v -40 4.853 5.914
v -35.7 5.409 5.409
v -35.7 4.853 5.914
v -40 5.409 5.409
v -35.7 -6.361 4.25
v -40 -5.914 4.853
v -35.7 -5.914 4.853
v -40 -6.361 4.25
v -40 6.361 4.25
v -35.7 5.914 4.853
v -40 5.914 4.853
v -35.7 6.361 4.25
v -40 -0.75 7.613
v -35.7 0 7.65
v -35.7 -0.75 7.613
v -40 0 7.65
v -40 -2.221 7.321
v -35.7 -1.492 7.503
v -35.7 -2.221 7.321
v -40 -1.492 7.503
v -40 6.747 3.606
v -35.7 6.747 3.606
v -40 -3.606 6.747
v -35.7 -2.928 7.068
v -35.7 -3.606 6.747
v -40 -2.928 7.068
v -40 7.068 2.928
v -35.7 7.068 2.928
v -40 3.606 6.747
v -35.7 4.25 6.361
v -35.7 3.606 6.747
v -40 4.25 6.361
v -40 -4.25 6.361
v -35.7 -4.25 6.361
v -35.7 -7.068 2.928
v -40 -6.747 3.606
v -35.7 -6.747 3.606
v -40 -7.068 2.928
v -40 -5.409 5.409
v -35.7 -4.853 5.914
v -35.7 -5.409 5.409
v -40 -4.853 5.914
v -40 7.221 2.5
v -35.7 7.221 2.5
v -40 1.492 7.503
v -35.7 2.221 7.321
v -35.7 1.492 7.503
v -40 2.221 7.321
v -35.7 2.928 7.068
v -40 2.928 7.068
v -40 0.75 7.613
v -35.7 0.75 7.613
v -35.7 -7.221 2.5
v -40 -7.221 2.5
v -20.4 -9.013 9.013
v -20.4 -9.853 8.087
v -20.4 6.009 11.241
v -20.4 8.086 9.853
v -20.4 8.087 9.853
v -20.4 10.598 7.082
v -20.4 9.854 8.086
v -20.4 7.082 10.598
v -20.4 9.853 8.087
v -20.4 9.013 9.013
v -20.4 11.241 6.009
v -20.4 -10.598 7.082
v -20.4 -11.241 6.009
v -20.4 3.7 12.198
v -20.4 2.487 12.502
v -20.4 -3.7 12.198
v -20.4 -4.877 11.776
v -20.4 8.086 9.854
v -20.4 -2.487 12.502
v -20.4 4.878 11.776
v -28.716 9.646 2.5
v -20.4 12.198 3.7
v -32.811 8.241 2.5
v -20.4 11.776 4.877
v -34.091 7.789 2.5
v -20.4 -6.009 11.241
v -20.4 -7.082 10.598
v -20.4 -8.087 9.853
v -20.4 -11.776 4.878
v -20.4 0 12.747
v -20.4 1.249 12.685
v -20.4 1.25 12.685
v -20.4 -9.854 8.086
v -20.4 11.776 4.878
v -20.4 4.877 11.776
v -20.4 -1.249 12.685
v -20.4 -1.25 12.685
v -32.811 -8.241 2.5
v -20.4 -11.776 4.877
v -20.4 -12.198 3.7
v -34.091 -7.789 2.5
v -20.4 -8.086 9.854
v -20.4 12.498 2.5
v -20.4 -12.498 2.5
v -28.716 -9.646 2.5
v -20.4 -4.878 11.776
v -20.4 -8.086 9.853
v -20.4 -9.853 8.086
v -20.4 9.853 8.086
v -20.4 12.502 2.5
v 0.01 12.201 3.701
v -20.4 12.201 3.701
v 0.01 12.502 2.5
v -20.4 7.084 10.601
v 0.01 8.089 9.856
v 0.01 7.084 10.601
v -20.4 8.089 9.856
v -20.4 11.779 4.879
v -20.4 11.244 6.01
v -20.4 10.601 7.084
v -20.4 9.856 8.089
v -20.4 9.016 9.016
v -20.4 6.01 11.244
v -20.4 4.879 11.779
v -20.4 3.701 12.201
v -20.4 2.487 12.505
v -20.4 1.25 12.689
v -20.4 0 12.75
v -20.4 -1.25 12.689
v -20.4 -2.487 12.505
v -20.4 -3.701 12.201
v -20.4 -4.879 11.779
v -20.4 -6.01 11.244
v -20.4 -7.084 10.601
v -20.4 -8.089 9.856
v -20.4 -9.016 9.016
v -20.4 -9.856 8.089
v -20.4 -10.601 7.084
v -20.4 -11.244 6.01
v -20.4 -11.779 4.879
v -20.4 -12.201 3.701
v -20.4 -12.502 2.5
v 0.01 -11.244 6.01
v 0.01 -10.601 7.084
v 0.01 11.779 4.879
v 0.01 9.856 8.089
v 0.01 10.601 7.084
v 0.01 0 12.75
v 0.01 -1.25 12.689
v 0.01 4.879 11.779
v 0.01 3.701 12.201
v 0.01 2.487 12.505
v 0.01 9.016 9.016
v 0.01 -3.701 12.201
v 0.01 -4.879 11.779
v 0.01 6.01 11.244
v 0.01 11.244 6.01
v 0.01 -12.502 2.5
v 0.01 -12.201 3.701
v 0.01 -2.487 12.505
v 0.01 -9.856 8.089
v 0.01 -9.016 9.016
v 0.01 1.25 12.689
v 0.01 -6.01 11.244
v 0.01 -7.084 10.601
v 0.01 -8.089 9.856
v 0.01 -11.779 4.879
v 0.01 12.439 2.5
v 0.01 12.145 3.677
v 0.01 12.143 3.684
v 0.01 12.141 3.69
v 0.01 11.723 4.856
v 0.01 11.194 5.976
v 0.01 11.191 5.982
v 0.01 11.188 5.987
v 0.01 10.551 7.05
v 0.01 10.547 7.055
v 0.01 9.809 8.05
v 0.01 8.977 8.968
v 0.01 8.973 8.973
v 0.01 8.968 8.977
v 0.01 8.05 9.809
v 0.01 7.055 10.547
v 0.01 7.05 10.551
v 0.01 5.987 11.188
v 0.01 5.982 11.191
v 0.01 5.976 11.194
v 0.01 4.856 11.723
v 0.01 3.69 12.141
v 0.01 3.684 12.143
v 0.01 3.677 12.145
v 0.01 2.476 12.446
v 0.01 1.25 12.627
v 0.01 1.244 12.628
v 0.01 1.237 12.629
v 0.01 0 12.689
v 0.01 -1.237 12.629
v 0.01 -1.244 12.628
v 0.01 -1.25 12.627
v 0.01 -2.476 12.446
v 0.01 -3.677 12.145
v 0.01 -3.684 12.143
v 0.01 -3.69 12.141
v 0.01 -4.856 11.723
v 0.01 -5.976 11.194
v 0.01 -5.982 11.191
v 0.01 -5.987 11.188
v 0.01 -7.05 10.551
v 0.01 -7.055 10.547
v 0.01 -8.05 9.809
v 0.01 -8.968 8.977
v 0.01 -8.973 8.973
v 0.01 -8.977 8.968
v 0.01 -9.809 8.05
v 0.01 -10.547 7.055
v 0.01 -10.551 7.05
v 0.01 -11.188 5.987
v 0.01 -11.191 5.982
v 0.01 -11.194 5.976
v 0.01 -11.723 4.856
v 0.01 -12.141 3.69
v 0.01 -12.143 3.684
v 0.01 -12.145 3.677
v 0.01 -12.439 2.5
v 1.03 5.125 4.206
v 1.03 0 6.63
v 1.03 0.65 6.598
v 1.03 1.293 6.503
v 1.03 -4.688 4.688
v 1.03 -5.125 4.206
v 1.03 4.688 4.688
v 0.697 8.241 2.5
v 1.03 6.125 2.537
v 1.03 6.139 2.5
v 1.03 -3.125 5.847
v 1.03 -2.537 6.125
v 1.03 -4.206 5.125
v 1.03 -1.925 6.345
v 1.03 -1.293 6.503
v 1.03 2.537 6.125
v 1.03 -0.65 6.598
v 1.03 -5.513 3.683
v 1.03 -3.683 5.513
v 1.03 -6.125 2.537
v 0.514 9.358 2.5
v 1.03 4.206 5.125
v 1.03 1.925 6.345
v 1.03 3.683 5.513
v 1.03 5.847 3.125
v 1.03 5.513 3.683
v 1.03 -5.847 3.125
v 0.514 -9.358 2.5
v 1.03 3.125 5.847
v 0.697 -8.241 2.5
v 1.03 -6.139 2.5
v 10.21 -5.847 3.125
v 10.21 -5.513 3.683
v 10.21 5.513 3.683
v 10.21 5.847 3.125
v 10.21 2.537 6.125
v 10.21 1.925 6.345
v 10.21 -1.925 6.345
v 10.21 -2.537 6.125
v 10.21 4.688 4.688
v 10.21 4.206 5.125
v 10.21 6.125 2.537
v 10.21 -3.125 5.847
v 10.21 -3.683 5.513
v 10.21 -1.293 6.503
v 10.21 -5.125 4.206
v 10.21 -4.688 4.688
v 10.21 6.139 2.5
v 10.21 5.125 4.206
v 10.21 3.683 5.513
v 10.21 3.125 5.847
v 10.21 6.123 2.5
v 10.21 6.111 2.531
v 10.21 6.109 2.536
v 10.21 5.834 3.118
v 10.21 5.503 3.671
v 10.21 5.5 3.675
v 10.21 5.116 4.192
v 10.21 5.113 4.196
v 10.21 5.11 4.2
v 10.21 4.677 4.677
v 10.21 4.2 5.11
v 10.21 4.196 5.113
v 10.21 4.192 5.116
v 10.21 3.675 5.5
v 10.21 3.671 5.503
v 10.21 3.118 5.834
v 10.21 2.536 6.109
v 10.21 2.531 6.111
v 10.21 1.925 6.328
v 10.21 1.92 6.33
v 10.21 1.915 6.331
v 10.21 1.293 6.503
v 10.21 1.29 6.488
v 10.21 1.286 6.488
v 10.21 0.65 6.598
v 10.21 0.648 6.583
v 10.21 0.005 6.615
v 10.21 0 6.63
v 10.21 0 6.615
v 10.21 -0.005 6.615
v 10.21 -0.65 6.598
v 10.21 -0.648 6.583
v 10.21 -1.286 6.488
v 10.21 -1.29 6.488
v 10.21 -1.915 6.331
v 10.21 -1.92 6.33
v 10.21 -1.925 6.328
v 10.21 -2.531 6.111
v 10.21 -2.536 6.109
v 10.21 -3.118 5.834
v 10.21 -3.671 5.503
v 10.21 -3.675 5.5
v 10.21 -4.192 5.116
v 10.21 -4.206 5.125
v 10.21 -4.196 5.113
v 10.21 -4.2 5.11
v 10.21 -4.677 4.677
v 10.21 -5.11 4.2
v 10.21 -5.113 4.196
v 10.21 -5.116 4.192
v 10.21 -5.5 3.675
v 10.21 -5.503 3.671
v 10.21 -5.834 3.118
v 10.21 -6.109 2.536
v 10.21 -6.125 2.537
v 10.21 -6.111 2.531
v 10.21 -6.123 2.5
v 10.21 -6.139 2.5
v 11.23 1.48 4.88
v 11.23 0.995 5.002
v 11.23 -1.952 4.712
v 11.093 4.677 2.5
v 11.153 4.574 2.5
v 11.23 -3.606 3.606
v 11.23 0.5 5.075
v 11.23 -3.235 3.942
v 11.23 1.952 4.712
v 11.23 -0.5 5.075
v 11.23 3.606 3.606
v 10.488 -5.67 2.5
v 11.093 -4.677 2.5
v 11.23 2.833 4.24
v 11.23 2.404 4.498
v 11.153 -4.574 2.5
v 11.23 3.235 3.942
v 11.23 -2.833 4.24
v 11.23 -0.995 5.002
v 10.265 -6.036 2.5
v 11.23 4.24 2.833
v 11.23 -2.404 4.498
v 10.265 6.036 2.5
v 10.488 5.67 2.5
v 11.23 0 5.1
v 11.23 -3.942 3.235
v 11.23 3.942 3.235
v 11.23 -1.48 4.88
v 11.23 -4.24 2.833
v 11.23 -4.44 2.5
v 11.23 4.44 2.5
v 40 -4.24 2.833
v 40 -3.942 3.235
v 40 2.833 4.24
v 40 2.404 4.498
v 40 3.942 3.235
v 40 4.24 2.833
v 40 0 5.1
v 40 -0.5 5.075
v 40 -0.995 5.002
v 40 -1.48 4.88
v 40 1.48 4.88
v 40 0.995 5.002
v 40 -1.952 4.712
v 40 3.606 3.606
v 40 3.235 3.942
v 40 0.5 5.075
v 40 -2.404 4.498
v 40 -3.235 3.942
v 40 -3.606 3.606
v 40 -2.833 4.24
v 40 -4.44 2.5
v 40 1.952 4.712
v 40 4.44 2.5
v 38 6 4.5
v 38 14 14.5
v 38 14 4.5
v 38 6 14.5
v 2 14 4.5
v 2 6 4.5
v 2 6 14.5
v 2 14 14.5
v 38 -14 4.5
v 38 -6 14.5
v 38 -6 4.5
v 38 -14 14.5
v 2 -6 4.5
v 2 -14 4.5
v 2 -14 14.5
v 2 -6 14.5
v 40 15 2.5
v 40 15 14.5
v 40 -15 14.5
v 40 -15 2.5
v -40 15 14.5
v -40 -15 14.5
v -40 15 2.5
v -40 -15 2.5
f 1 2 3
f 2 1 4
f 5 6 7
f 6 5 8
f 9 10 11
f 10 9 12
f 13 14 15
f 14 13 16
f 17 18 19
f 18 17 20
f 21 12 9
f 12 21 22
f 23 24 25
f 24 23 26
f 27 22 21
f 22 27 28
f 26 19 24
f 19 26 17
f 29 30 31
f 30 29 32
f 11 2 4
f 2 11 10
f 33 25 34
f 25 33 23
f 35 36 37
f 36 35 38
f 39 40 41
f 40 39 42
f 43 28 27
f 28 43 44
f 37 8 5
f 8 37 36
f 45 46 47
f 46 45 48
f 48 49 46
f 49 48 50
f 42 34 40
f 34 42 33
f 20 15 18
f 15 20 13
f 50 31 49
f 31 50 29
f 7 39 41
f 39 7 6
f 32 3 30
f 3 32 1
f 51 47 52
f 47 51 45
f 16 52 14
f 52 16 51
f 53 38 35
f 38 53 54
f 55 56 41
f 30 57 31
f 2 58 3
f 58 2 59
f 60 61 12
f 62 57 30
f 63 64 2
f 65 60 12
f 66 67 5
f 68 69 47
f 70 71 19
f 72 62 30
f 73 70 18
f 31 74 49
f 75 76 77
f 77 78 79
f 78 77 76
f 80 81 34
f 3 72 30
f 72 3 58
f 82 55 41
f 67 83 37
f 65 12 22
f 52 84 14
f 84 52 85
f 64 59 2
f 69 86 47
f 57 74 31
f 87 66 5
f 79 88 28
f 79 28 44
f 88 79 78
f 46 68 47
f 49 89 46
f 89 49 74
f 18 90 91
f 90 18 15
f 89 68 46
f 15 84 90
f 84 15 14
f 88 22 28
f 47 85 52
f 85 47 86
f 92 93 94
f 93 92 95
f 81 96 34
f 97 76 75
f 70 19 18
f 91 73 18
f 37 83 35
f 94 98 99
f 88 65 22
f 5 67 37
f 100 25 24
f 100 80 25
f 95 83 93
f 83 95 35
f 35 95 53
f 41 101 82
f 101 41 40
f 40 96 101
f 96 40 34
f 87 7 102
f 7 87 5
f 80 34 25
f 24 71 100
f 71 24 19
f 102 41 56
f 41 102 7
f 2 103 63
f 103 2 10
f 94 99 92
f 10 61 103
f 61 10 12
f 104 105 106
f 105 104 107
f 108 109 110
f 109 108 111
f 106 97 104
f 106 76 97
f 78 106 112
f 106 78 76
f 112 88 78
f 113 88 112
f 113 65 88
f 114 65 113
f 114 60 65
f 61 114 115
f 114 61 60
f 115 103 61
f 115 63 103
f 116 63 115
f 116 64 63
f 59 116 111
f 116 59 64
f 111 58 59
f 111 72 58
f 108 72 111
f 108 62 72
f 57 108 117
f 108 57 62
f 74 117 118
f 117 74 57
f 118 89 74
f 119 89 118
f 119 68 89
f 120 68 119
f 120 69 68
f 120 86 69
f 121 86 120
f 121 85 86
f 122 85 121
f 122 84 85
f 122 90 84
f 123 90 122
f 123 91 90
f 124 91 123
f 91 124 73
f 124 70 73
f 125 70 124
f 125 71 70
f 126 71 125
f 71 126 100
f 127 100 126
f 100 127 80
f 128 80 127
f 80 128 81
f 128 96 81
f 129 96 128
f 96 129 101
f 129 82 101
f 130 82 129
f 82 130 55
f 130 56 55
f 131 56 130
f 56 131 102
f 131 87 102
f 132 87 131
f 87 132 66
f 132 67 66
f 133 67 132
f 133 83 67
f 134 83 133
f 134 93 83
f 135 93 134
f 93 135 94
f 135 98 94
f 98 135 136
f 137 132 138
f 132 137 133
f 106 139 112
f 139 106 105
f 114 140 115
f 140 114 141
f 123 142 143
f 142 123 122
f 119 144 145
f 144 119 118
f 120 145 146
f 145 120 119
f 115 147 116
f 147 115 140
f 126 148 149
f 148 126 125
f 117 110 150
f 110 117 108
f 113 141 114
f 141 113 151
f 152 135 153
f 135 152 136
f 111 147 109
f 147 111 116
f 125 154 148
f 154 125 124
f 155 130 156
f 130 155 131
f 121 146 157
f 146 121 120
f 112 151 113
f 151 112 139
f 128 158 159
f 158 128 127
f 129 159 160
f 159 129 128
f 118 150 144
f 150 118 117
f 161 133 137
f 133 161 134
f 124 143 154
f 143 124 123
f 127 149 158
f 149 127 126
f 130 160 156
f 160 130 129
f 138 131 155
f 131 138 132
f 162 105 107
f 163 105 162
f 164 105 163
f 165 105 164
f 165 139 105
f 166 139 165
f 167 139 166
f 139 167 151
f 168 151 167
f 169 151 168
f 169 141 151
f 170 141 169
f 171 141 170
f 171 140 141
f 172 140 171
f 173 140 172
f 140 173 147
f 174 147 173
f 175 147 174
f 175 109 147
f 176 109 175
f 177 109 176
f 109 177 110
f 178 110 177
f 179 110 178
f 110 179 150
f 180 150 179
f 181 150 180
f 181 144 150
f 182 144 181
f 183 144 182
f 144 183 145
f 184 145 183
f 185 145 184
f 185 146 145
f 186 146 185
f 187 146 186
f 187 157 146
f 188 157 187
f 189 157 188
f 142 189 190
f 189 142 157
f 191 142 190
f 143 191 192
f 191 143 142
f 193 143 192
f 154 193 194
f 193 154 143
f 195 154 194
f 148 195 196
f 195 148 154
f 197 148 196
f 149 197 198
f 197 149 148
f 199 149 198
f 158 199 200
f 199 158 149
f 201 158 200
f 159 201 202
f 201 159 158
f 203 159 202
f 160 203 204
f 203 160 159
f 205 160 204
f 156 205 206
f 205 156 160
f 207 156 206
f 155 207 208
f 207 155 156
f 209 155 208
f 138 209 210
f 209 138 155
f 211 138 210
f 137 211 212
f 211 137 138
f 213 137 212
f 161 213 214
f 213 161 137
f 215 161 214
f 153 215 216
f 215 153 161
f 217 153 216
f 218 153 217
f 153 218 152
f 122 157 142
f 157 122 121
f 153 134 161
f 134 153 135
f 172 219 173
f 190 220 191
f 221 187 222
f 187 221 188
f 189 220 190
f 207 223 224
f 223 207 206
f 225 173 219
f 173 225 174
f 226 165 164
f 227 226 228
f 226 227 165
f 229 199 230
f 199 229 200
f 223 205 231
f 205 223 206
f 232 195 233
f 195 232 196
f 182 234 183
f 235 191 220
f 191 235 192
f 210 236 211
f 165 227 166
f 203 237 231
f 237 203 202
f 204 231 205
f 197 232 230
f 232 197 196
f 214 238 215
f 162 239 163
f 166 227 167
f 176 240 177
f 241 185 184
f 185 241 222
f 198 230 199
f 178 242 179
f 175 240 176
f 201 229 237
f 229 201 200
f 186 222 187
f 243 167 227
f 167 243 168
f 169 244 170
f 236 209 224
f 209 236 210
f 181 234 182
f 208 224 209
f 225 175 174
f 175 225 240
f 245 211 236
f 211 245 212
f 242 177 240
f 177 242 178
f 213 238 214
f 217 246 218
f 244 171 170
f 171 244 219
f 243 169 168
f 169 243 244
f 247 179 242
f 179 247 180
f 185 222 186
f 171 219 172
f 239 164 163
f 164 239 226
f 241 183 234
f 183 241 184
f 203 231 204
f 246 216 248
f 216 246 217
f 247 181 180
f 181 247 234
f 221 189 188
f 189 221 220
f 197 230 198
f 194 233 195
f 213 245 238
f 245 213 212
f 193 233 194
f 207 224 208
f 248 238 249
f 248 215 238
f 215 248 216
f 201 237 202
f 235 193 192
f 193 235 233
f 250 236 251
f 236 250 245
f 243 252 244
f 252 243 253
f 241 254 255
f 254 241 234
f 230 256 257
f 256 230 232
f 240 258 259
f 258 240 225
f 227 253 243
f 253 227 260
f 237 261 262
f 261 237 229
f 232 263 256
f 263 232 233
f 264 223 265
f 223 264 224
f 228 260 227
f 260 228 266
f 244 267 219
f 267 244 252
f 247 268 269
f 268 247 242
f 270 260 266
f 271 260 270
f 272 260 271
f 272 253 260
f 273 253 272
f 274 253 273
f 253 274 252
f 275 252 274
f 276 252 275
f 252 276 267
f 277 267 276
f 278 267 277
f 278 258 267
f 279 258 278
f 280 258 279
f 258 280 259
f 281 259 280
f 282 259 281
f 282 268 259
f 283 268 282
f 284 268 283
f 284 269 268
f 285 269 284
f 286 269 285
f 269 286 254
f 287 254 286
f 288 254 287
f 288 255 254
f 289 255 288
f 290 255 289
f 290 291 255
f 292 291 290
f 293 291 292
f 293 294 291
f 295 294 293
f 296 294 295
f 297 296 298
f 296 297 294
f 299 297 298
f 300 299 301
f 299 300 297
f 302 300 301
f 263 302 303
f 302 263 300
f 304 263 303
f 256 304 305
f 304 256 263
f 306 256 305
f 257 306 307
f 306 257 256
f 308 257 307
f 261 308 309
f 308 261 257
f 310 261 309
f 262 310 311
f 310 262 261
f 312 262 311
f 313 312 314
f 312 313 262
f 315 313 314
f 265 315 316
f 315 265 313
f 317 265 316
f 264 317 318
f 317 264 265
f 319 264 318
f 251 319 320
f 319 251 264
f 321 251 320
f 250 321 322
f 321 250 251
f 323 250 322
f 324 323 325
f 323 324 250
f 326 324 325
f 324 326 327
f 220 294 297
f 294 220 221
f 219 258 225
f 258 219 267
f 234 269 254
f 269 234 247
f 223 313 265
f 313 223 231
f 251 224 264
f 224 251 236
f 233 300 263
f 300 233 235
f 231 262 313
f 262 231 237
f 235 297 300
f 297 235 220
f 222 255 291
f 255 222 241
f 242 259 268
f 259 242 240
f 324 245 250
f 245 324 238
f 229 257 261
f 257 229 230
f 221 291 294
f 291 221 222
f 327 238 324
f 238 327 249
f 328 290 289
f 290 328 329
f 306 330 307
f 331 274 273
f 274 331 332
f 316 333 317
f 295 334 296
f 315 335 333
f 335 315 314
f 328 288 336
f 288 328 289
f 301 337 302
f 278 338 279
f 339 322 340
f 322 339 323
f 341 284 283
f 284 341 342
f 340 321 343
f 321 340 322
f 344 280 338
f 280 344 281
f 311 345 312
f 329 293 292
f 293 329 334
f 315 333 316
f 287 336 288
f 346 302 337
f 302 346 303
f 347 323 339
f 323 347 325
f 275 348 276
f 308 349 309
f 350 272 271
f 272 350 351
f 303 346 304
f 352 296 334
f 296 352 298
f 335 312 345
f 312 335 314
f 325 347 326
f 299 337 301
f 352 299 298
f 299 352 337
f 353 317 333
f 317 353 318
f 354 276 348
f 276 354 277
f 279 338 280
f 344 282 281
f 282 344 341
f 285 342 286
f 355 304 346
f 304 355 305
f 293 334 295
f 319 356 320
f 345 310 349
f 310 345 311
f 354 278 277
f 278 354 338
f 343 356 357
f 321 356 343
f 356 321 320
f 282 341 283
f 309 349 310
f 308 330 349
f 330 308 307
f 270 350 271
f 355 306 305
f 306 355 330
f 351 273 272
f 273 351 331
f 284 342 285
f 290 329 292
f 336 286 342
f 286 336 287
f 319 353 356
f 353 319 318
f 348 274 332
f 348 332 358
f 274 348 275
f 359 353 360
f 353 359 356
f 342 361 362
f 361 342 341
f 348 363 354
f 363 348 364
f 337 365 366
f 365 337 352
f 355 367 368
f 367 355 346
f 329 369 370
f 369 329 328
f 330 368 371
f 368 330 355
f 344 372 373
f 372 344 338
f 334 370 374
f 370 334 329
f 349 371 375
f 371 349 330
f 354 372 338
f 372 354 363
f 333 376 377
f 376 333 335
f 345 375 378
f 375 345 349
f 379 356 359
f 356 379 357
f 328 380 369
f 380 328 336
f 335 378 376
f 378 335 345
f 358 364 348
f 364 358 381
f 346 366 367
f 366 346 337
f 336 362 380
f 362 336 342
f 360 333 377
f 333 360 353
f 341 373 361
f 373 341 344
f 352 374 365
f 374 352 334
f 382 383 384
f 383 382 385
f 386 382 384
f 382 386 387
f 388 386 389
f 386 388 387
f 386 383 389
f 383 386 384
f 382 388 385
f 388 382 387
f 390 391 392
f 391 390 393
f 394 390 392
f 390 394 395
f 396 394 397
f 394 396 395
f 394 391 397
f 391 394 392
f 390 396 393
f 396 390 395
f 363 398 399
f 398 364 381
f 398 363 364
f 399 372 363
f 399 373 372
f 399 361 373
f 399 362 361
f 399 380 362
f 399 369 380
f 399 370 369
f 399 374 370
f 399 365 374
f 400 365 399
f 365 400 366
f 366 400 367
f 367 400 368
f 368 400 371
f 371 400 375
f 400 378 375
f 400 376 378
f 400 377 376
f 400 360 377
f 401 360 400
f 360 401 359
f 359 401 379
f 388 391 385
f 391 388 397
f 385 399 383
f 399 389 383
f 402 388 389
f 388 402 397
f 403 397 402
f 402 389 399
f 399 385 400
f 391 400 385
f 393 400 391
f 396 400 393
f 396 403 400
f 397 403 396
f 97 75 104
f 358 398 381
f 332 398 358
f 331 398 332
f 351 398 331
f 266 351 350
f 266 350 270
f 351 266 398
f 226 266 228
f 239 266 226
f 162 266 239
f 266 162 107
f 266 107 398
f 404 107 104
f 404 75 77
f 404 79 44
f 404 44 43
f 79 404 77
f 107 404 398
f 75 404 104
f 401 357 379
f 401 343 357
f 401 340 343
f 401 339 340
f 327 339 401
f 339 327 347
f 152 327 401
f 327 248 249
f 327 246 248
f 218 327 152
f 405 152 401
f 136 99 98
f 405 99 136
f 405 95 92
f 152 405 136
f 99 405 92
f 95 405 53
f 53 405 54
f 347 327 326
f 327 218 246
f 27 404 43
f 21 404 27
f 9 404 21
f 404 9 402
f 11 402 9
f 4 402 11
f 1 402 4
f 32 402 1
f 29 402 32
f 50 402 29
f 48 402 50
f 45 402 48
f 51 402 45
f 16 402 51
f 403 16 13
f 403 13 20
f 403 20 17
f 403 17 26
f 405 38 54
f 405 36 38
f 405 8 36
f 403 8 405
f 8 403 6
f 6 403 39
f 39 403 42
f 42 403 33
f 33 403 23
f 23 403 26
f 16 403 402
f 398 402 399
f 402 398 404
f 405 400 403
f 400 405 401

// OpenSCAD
$fn=64;

ocr=25;
bedh=12;
both=2;
toth=2;
snib=0.01;

difference(){
	translate([0,0,ocr/2-bedh/2+both]) makebed();
	rotate([0,90,0])    scale(1.02) makedrill();   
  translate([20,0,ocr/2-bedh/2+both+toth]) makebedhollow(36,26,10);
}
	
//donut(xr,[0,90,0]);

module makebed(){
  cube([80,30,bedh],center=true);
}
module makebedhollow(l,w,c){  
  translate([0,c,0])cube([l,w/2-c/2,bedh],center=true);
  translate([0,-c,0])cube([l,w/2-c/2,bedh],center=true);
}
module makedrill(){
   union(){
	   translate([0,0,-75])cylinder(r=15/2,h=40+snib);
   	translate([0,0,-35])cylinder(r1=15/2,r2=ocr/2,h=15+snib);
	   translate([0,0,-20])cylinder(r=ocr/2,h=20+snib);
	   translate([0,0,0])cylinder(r1=ocr/2,r2=13/2,h=1+snib);
   	translate([0,0,0])cylinder(r=13/2,h=10+snib);
	   translate([0,0,10])cylinder(r1=13/2,r2=10/2,h=1+snib);
		translate([0,0,10])cylinder(r=10/2,h=30+snib*2);
	}	
}

module test(){
	rotate_extrude(convexity=10,$fn=smooth)
		translate([cr-ct-r,ct+r,0])
			circle(r=r,$fn=smooth);
}

module donut(r,rot=[0,0,0]){

pad = 0.1;	// Padding to maintain manifold
ch = 15;
cr = 20;
ct = 2;
xr = 4;
smooth = 180;	// Number of facets of rounding cylinder

   rotate(rot)
		rotate_extrude(convexity=10,$fn=smooth)
			translate([cr-ct-r,ct+r,0])
				circle(r=r,$fn=smooth);
}
